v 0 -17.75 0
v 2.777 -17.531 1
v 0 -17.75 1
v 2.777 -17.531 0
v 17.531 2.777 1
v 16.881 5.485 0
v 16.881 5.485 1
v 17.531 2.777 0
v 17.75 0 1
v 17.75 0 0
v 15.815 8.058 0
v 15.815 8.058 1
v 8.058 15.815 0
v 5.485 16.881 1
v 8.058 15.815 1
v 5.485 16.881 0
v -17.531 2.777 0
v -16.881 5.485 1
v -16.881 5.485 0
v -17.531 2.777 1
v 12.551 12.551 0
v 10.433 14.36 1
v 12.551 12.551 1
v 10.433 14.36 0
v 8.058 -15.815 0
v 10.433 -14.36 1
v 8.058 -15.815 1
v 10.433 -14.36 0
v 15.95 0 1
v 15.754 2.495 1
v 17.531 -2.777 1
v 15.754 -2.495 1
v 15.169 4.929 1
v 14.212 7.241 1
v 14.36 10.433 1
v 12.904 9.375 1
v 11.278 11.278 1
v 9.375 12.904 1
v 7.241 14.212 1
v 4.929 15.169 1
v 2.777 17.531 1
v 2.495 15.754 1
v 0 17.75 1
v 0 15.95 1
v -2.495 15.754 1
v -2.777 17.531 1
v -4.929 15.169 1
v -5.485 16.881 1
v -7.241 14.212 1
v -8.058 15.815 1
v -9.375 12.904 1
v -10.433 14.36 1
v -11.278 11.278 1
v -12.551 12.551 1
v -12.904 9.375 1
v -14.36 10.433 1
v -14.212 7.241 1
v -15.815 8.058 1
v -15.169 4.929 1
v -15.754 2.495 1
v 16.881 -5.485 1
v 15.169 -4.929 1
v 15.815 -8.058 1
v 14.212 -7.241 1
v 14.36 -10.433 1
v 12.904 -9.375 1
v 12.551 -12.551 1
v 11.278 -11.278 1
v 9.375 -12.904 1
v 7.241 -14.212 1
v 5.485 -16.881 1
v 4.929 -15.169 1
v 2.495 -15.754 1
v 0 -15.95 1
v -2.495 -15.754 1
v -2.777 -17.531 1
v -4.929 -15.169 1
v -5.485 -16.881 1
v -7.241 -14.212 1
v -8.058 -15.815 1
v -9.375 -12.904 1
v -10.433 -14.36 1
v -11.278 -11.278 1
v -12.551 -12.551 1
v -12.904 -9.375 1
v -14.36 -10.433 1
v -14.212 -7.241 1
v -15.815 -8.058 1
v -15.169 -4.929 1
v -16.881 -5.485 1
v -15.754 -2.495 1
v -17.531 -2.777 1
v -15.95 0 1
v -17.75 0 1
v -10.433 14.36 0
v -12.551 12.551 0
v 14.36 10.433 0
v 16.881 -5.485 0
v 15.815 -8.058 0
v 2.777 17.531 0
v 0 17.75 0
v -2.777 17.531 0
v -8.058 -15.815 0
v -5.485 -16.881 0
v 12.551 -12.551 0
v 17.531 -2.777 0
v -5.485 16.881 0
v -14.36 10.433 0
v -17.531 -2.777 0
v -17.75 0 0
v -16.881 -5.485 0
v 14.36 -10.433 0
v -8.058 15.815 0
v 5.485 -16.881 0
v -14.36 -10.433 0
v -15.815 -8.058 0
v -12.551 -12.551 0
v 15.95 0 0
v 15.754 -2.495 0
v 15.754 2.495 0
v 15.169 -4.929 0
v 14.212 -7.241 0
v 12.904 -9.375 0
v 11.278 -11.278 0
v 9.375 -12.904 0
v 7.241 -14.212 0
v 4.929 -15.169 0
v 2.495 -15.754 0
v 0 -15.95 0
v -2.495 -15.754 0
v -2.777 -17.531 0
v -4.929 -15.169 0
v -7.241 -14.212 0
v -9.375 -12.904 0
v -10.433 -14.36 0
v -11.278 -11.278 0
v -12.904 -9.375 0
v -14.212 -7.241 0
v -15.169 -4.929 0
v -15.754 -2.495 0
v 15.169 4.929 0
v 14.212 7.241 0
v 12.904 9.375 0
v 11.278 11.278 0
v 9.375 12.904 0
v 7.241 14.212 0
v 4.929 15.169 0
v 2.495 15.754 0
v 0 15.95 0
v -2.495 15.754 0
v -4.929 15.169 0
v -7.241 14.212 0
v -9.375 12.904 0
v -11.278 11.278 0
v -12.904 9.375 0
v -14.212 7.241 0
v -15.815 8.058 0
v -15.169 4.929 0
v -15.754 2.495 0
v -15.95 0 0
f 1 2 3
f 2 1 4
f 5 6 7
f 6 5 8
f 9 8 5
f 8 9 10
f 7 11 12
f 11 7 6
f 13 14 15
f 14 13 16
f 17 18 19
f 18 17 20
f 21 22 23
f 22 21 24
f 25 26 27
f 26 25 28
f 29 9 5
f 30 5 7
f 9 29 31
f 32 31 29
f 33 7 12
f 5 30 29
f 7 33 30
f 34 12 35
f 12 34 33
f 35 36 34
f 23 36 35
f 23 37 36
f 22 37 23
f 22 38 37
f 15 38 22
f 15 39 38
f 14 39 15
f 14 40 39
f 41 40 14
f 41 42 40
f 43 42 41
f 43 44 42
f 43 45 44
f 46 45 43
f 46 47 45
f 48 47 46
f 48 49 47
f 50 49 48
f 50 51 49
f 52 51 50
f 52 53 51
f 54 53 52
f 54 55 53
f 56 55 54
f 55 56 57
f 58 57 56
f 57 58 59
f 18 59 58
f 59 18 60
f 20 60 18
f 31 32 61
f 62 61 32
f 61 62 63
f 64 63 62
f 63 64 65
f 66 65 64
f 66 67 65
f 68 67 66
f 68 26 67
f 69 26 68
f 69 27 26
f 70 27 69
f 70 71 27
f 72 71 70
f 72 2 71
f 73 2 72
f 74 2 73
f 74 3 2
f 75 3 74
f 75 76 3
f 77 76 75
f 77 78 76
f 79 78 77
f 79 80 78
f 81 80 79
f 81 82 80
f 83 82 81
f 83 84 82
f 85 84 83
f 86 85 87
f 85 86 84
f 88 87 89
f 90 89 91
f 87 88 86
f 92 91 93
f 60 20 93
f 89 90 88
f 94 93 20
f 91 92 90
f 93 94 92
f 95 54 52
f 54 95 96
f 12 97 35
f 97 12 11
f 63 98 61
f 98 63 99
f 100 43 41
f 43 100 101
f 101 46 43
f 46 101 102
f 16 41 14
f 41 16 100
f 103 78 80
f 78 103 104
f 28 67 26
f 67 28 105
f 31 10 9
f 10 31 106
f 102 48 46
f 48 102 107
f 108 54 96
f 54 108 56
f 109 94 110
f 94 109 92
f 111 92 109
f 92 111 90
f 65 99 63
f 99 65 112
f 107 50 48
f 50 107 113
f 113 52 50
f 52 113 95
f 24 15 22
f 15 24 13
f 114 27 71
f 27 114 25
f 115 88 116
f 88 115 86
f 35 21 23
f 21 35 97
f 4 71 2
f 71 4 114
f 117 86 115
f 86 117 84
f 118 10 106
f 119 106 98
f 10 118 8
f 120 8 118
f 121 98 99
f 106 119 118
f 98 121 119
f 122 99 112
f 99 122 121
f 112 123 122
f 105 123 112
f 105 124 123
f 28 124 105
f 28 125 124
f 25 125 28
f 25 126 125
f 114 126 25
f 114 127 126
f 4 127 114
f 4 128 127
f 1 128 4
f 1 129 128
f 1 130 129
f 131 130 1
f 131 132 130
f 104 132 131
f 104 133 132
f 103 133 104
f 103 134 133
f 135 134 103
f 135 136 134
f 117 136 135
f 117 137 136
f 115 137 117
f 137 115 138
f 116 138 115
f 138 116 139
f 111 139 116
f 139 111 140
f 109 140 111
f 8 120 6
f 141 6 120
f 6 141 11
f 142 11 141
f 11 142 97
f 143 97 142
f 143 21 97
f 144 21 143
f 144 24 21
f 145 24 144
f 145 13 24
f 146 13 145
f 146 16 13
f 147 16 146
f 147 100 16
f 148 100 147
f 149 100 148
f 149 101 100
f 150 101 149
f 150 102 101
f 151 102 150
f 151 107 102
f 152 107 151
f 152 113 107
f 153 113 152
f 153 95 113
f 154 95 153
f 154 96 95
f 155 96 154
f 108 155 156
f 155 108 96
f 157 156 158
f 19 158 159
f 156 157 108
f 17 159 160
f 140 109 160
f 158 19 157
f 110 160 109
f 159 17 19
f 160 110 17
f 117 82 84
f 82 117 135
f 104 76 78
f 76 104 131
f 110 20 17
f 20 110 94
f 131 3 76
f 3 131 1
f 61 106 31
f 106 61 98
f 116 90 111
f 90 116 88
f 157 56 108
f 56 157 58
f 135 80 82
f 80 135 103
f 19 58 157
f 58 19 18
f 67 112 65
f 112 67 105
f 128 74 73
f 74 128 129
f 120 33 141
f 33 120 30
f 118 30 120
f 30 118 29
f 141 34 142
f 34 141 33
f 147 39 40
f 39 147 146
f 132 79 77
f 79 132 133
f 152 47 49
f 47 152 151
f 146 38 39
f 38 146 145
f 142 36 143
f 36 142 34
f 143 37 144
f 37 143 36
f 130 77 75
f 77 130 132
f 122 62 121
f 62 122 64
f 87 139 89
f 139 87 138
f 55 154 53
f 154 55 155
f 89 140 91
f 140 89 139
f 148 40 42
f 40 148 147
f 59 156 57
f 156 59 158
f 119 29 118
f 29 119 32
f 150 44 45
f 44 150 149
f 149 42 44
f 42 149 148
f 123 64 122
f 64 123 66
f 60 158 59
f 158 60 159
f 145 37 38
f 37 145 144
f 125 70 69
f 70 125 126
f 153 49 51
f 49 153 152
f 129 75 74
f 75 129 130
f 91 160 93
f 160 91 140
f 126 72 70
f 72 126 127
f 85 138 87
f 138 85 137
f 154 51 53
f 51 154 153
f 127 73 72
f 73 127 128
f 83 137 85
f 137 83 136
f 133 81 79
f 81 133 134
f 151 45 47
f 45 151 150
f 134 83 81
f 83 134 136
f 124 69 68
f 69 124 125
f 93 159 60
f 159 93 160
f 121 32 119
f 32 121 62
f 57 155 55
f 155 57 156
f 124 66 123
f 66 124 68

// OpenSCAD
// file: ../Dollo/NEW_long_ties/long_bow_tie.scad
tilt_level = 1.1;

include <include.scad>;
include <globals.scad>;

obj_leg = 12;

function scale_x() = 1;
function scale_z() = (male_dove_depth-0.2)/male_dove_depth;

length = 50;

// shifts the upper dove to right
_offset = 0;


//long_bow_tie();
//long_bow_tie(25);

//long_bow_tie_half(length);
//long_bow_tie_half(30);
//long_bow_tie_half_split(length);

long_bow_tie_split(length);
//long_bow_tie_split(30);



module bow_tie_master(length){
    dovetail_3d(
        male_dove_max_width,
        male_dove_min_width,
        male_dove_depth,
        length
    );
}

module long_bow_tie_unscaled(length) {

    module endcyl() {
        translate([0, 0, -3])
        cylinder(d=24, h=6, $fn=60);
    }

    module endtub() {
        rotate([0, 90, 0])
        translate([0, 0, -15/2])
        difference() {
            cylinder(d=20, h=15, $fn=60);
            cylinder(d=12, h=16, $fn=60);

            translate([-20, 0, -0.1])
            cube([40, 20, 16]);
        }
    }

    module _half() {

        translate([0, length/2, 0])
        difference() {
            intersection(){
                rotate([90, 0, 0])
                bow_tie_master(length);

                rotate([90, 0, 0])
                cylinder(r=5.8, h=length * 2);
            }
            translate([13, 5, 0])
            rotate([90, 0, 25])
            endcyl();

            translate([-13, 5, 0])
            rotate([90, 0, -25])
            endcyl();

            translate([13, -length - 5, 0])
            rotate([90, 0, -25])
            endcyl();

            translate([-13, -length - 5, 0])
            rotate([90, 0, 25])
            endcyl();

            translate([0, -length + 4.5, 0])
            endtub();

            translate([0, -4.5, 0])
            rotate([180, 0, 0])
            endtub();
        }
    }

    union() {
        translate([_offset, 0, 0])
        _half();

        mirror([0, 0, 1])
        _half();
    }
}

module long_bow_tie(
    length=length, scale_x=scale_x(), 
    scale_z=scale_z(), middle=false) {

    scale([scale_x, 1, scale_z]) {
        if(middle) {
            long_bow_tie_unscaled(length);
        } else {
            translate([0, 0, male_dove_depth])
            long_bow_tie_unscaled(length);
        }
    }
}

module split(length) {
    translate([0, 0, -length/2 - 1])
    linear_extrude(height=length + 2)
    polygon(points=[
        [0, -1.5], [0.9, -1.5], [2, -5],
        [-2, -5], [-0.9, -1.5]
    ]);
}

module long_bow_tie_split(
    length=length, scale_x=scale_x(),
    scale_z=scale_z(), middle=false
) {

    module _do_split() {
        rotate([90, 0, 0])
        difference() {
            rotate([-90, 0, 0])
            long_bow_tie(
                length, scale_x=scale_x,
                scale_z=scale_z, middle=true);

            split(length);

            translate([_offset, 0, 0])
            rotate([0, 0, 180])
            split(length);
        }
    }
        
    if (!middle) {
        translate([0, 0, scale_z * male_dove_depth])
        _do_split();
    } else {
        _do_split();
    }
}

module long_bow_tie_half(
    length=length, scale_x=scale_x(),
    scale_z=scale_z(), middle=true) {

    rotate([0, -90, 0])
    intersection() {
        long_bow_tie(length, middle=middle);

        translate([0, -length/2, -24/2])
        chamfered_cube(
            13, length, 24, 1
        );
    }
}

module long_bow_tie_half_split(
    length=length, scale_x=scale_x(),
    scale_z=scale_z()) {

    union() {
        intersection() {
            long_bow_tie_split(length,
                scale_x=scale_x,
                scale_z=scale_z,
                middle=true);
            translate([0, 0, -6/2])
            cube([10, length, 6], center=true);
        }
        cube([scale_x*male_dove_min_width, length,
              1.6], center=true);

        translate([((scale_x*male_dove_min_width)/2)/2, 0, 4/2])
        cube([(scale_x*male_dove_min_width)/2, length,
              4], center=true);

        translate([0, 0, 4])
        intersection() {
            long_bow_tie(
                length,scale_x=scale_x, scale_z=scale_z,
                middle=true);

            translate([5/2, 0, 5/2])
            cube([5, length, 5], center=true);
        }
    }
}
// file: ../Dollo/NEW_long_ties/globals.scad
/*
Most things in this file is represented as one millimeter, so keep that in mind while changing things.
Some of the setting are not mm but at variables that you can set, such as 2*x=2x and you are setting what x is.
I will try to specify when things are variables and not exact measurements.
*/

// printer slop
slop = 0.15;

obj_leg = 30;
leg_length = 5.5;
small_number = 0.001;
metal_core_rode_global = 5;


///////////////// number of holes /////////////////////
z_hole_number = 8;
other_holes = 8;

///////////////// Pins /////////////////////

//pins that poke out
ball_size = 10;
pin_height = 20;
pin_diameter = 6;


//holes
hole_ball_size = ball_size;
hole_pin_height = pin_height;
hole_pin_diameter = pin_diameter;

///////////////// Z THINGS /////////////////////

berring_slot_width = 7.5;
berring_slot_depth = 6.5;
metal_core_rode = 5;

///////////////// X THINGS /////////////////////

//male dove tails
male_dove_max_width=8;
male_dove_min_width=5;
male_dove_depth=5;
male_dove_height=obj_leg/2;

function scaled_male_dove_max_width() = male_dove_max_width - slop;
function scaled_male_dove_min_width() = male_dove_min_width - slop;
function scaled_male_dove_depth() = male_dove_depth - slop;

//female dove tails, this is found on the y mounts
girl_max_width=11;
girl_min_width=5;
girl_depth=5;
girl_height=obj_leg;


///////////////// Y THINGS /////////////////////
/*
The Y is so normal that all of those global variables at the top should change all of the setting in it, this section is set her incase there are variables set in the future development of this project.
*/

// stepper
motor_side_length = 43.2;
motor_bolt_hole_distance = 31;
motor_center_hole = 23;
motor_shaft_dia = 5;
motor_shaft_hole_dia = 5+2*slop;

// bolts etc.
bolt_hole_dia = 3+2*slop;
bolt_head_hole_dia = 5.8;

m4_bolt_hole_dia = 4+2*slop;
m4_bolt_head_hole_dia = 6.8+2*slop;


m3_nut_side = 5.65;
m3_nut_height = 2.3;
m4_nut_side = 6.85;
m4_nut_height = 3.1;

// threaded rod
lifter_rod_diam = 9.86;
hole_threaded_rod = lifter_rod_diam+2*slop;

// for the extensions
metal_rod_size = 9;
// file: ../Dollo/NEW_long_ties/long_tie.scad
length = 50;

include <include.scad>;
include <globals.scad>;

use <long_bow_tie.scad>;

$fn=30;

// alter these the get properly fitting parts
scale_x = scale_x();
scale_z = scale_z();
length = 50;

module long_tie(length=length) {
    translate([0,0,scaled_male_dove_depth()]) rotate([0,180,0]) difference(){
        long_bow_tie(length, scale_x=scale_x, scale_z=scale_z);
        translate([-5,-length/2-1,scaled_male_dove_depth()]) cube([10,length+2,male_dove_depth]);
    }
}

module long_tie_split(length=length) {
    union() {
        difference() {
            translate([0,0,-male_dove_depth+slop]) long_bow_tie_split(length);
            translate([0,0, -3.5]) cube([10,length+1,7], center=true);
        }
        translate([0,0, 0.8]) cube([4,length,1.6], center=true);
    }
}

module long_tie_half(length=length) {
    rotate([0,-90,0]) intersection() {
        long_tie(length);
        translate([0,-length/2,0]) cube([5,length,5]);
    }
}

long_tie(length);
//long_tie_half(length);
//long_tie_split(length);
// main file
use <../Dollo/NEW_long_ties/include.scad>;
use <../Dollo/NEW_long_ties/long_tie.scad>;

stl_base_path = "../_downloaded/";
spath = str(
    stl_base_path, "Tesla/Tesla Model 3 Angle adapter for trailer hitch (Europe)/"
);


//_orig_angle_adapter();


//angle_adapter_180();
//adapter_seal();
qnd_fix();


module _orig_angle_adapter() {
    import(
        str(spath, "Tesla_Model_3_Winkeladapter_V2.2.stl"),
        convexity=10
    );
}


module angle_adapter_180() {

    module _threads() {
        intersection() {
            _orig_angle_adapter();
            translate([0, 53, 53])
            cylinder(d=43, h=35);
        }
    }

    module _adapters_sans_threads() {
        difference() {
            _orig_angle_adapter();

            translate([0, 53, 53.01])
            cylinder(d=43, h=35);
        }
    }

    union() {
        translate([0, 53 * 2, 0])
        rotate([0, 0, 180])
        _threads();

        _adapters_sans_threads();
    }
    %_orig_angle_adapter();
}

module adapter_seal() {

    module _seal_form(d, h, wall) {
        d1 = d;
        d2 = d - 2 * wall;

        difference() {
            intersection() {
                cylinder(d=d1, h=h, $fn=50);

                cube([d * 2, d1 * 0.87, 100], center=true);
            }

            intersection() {
                cylinder(
                    d=d2, h=h*3,
                    center=true, $fn=50
                );

                cube([
                    d * 2, d * 0.87 - 2*wall,
                    100
                ], center=true);
            }
        }
    }
    
    union() {
        rotate([90, 0, 0])
        intersection() {
            _orig_angle_adapter();

            cube([200, 2, 200], center=true);
        }

        translate([0, -33, 0])
        _seal_form(70, 1.2, 0.5, $fn=150);

        translate([0, -33, 0])
        tube(49, 1.2, 0.5, $fn=150);

        difference() {
            translate([0, -33, 0])
            _seal_form(61, 1.2, 0.5, $fn=150);

            translate([-14, -8.5, 0])
            cylinder(d=6, h=10, center=true, $fn=150);

            translate([29, -33, 0])
            cylinder(d=6, h=10, center=true, $fn=150);

            translate([-14, -57.5, 0])
            cylinder(d=6, h=10, center=true, $fn=150);
        }

        translate([-14, -8.5, 0])
        tube(7, 1.2, 0.9, $fn=150);

        translate([29, -33, 0])
        tube(7, 1.2, 0.9, $fn=150);

        translate([-14, -57.5, 0])
        tube(7, 1.2, 0.9, $fn=150);
    }
}

module qnd_fix() {
    difference() {
        cylinder(d=35.5, h=1, $fn=40);

        cylinder(d=31.9, h=30, center=true, $fn=40);
    }
}
